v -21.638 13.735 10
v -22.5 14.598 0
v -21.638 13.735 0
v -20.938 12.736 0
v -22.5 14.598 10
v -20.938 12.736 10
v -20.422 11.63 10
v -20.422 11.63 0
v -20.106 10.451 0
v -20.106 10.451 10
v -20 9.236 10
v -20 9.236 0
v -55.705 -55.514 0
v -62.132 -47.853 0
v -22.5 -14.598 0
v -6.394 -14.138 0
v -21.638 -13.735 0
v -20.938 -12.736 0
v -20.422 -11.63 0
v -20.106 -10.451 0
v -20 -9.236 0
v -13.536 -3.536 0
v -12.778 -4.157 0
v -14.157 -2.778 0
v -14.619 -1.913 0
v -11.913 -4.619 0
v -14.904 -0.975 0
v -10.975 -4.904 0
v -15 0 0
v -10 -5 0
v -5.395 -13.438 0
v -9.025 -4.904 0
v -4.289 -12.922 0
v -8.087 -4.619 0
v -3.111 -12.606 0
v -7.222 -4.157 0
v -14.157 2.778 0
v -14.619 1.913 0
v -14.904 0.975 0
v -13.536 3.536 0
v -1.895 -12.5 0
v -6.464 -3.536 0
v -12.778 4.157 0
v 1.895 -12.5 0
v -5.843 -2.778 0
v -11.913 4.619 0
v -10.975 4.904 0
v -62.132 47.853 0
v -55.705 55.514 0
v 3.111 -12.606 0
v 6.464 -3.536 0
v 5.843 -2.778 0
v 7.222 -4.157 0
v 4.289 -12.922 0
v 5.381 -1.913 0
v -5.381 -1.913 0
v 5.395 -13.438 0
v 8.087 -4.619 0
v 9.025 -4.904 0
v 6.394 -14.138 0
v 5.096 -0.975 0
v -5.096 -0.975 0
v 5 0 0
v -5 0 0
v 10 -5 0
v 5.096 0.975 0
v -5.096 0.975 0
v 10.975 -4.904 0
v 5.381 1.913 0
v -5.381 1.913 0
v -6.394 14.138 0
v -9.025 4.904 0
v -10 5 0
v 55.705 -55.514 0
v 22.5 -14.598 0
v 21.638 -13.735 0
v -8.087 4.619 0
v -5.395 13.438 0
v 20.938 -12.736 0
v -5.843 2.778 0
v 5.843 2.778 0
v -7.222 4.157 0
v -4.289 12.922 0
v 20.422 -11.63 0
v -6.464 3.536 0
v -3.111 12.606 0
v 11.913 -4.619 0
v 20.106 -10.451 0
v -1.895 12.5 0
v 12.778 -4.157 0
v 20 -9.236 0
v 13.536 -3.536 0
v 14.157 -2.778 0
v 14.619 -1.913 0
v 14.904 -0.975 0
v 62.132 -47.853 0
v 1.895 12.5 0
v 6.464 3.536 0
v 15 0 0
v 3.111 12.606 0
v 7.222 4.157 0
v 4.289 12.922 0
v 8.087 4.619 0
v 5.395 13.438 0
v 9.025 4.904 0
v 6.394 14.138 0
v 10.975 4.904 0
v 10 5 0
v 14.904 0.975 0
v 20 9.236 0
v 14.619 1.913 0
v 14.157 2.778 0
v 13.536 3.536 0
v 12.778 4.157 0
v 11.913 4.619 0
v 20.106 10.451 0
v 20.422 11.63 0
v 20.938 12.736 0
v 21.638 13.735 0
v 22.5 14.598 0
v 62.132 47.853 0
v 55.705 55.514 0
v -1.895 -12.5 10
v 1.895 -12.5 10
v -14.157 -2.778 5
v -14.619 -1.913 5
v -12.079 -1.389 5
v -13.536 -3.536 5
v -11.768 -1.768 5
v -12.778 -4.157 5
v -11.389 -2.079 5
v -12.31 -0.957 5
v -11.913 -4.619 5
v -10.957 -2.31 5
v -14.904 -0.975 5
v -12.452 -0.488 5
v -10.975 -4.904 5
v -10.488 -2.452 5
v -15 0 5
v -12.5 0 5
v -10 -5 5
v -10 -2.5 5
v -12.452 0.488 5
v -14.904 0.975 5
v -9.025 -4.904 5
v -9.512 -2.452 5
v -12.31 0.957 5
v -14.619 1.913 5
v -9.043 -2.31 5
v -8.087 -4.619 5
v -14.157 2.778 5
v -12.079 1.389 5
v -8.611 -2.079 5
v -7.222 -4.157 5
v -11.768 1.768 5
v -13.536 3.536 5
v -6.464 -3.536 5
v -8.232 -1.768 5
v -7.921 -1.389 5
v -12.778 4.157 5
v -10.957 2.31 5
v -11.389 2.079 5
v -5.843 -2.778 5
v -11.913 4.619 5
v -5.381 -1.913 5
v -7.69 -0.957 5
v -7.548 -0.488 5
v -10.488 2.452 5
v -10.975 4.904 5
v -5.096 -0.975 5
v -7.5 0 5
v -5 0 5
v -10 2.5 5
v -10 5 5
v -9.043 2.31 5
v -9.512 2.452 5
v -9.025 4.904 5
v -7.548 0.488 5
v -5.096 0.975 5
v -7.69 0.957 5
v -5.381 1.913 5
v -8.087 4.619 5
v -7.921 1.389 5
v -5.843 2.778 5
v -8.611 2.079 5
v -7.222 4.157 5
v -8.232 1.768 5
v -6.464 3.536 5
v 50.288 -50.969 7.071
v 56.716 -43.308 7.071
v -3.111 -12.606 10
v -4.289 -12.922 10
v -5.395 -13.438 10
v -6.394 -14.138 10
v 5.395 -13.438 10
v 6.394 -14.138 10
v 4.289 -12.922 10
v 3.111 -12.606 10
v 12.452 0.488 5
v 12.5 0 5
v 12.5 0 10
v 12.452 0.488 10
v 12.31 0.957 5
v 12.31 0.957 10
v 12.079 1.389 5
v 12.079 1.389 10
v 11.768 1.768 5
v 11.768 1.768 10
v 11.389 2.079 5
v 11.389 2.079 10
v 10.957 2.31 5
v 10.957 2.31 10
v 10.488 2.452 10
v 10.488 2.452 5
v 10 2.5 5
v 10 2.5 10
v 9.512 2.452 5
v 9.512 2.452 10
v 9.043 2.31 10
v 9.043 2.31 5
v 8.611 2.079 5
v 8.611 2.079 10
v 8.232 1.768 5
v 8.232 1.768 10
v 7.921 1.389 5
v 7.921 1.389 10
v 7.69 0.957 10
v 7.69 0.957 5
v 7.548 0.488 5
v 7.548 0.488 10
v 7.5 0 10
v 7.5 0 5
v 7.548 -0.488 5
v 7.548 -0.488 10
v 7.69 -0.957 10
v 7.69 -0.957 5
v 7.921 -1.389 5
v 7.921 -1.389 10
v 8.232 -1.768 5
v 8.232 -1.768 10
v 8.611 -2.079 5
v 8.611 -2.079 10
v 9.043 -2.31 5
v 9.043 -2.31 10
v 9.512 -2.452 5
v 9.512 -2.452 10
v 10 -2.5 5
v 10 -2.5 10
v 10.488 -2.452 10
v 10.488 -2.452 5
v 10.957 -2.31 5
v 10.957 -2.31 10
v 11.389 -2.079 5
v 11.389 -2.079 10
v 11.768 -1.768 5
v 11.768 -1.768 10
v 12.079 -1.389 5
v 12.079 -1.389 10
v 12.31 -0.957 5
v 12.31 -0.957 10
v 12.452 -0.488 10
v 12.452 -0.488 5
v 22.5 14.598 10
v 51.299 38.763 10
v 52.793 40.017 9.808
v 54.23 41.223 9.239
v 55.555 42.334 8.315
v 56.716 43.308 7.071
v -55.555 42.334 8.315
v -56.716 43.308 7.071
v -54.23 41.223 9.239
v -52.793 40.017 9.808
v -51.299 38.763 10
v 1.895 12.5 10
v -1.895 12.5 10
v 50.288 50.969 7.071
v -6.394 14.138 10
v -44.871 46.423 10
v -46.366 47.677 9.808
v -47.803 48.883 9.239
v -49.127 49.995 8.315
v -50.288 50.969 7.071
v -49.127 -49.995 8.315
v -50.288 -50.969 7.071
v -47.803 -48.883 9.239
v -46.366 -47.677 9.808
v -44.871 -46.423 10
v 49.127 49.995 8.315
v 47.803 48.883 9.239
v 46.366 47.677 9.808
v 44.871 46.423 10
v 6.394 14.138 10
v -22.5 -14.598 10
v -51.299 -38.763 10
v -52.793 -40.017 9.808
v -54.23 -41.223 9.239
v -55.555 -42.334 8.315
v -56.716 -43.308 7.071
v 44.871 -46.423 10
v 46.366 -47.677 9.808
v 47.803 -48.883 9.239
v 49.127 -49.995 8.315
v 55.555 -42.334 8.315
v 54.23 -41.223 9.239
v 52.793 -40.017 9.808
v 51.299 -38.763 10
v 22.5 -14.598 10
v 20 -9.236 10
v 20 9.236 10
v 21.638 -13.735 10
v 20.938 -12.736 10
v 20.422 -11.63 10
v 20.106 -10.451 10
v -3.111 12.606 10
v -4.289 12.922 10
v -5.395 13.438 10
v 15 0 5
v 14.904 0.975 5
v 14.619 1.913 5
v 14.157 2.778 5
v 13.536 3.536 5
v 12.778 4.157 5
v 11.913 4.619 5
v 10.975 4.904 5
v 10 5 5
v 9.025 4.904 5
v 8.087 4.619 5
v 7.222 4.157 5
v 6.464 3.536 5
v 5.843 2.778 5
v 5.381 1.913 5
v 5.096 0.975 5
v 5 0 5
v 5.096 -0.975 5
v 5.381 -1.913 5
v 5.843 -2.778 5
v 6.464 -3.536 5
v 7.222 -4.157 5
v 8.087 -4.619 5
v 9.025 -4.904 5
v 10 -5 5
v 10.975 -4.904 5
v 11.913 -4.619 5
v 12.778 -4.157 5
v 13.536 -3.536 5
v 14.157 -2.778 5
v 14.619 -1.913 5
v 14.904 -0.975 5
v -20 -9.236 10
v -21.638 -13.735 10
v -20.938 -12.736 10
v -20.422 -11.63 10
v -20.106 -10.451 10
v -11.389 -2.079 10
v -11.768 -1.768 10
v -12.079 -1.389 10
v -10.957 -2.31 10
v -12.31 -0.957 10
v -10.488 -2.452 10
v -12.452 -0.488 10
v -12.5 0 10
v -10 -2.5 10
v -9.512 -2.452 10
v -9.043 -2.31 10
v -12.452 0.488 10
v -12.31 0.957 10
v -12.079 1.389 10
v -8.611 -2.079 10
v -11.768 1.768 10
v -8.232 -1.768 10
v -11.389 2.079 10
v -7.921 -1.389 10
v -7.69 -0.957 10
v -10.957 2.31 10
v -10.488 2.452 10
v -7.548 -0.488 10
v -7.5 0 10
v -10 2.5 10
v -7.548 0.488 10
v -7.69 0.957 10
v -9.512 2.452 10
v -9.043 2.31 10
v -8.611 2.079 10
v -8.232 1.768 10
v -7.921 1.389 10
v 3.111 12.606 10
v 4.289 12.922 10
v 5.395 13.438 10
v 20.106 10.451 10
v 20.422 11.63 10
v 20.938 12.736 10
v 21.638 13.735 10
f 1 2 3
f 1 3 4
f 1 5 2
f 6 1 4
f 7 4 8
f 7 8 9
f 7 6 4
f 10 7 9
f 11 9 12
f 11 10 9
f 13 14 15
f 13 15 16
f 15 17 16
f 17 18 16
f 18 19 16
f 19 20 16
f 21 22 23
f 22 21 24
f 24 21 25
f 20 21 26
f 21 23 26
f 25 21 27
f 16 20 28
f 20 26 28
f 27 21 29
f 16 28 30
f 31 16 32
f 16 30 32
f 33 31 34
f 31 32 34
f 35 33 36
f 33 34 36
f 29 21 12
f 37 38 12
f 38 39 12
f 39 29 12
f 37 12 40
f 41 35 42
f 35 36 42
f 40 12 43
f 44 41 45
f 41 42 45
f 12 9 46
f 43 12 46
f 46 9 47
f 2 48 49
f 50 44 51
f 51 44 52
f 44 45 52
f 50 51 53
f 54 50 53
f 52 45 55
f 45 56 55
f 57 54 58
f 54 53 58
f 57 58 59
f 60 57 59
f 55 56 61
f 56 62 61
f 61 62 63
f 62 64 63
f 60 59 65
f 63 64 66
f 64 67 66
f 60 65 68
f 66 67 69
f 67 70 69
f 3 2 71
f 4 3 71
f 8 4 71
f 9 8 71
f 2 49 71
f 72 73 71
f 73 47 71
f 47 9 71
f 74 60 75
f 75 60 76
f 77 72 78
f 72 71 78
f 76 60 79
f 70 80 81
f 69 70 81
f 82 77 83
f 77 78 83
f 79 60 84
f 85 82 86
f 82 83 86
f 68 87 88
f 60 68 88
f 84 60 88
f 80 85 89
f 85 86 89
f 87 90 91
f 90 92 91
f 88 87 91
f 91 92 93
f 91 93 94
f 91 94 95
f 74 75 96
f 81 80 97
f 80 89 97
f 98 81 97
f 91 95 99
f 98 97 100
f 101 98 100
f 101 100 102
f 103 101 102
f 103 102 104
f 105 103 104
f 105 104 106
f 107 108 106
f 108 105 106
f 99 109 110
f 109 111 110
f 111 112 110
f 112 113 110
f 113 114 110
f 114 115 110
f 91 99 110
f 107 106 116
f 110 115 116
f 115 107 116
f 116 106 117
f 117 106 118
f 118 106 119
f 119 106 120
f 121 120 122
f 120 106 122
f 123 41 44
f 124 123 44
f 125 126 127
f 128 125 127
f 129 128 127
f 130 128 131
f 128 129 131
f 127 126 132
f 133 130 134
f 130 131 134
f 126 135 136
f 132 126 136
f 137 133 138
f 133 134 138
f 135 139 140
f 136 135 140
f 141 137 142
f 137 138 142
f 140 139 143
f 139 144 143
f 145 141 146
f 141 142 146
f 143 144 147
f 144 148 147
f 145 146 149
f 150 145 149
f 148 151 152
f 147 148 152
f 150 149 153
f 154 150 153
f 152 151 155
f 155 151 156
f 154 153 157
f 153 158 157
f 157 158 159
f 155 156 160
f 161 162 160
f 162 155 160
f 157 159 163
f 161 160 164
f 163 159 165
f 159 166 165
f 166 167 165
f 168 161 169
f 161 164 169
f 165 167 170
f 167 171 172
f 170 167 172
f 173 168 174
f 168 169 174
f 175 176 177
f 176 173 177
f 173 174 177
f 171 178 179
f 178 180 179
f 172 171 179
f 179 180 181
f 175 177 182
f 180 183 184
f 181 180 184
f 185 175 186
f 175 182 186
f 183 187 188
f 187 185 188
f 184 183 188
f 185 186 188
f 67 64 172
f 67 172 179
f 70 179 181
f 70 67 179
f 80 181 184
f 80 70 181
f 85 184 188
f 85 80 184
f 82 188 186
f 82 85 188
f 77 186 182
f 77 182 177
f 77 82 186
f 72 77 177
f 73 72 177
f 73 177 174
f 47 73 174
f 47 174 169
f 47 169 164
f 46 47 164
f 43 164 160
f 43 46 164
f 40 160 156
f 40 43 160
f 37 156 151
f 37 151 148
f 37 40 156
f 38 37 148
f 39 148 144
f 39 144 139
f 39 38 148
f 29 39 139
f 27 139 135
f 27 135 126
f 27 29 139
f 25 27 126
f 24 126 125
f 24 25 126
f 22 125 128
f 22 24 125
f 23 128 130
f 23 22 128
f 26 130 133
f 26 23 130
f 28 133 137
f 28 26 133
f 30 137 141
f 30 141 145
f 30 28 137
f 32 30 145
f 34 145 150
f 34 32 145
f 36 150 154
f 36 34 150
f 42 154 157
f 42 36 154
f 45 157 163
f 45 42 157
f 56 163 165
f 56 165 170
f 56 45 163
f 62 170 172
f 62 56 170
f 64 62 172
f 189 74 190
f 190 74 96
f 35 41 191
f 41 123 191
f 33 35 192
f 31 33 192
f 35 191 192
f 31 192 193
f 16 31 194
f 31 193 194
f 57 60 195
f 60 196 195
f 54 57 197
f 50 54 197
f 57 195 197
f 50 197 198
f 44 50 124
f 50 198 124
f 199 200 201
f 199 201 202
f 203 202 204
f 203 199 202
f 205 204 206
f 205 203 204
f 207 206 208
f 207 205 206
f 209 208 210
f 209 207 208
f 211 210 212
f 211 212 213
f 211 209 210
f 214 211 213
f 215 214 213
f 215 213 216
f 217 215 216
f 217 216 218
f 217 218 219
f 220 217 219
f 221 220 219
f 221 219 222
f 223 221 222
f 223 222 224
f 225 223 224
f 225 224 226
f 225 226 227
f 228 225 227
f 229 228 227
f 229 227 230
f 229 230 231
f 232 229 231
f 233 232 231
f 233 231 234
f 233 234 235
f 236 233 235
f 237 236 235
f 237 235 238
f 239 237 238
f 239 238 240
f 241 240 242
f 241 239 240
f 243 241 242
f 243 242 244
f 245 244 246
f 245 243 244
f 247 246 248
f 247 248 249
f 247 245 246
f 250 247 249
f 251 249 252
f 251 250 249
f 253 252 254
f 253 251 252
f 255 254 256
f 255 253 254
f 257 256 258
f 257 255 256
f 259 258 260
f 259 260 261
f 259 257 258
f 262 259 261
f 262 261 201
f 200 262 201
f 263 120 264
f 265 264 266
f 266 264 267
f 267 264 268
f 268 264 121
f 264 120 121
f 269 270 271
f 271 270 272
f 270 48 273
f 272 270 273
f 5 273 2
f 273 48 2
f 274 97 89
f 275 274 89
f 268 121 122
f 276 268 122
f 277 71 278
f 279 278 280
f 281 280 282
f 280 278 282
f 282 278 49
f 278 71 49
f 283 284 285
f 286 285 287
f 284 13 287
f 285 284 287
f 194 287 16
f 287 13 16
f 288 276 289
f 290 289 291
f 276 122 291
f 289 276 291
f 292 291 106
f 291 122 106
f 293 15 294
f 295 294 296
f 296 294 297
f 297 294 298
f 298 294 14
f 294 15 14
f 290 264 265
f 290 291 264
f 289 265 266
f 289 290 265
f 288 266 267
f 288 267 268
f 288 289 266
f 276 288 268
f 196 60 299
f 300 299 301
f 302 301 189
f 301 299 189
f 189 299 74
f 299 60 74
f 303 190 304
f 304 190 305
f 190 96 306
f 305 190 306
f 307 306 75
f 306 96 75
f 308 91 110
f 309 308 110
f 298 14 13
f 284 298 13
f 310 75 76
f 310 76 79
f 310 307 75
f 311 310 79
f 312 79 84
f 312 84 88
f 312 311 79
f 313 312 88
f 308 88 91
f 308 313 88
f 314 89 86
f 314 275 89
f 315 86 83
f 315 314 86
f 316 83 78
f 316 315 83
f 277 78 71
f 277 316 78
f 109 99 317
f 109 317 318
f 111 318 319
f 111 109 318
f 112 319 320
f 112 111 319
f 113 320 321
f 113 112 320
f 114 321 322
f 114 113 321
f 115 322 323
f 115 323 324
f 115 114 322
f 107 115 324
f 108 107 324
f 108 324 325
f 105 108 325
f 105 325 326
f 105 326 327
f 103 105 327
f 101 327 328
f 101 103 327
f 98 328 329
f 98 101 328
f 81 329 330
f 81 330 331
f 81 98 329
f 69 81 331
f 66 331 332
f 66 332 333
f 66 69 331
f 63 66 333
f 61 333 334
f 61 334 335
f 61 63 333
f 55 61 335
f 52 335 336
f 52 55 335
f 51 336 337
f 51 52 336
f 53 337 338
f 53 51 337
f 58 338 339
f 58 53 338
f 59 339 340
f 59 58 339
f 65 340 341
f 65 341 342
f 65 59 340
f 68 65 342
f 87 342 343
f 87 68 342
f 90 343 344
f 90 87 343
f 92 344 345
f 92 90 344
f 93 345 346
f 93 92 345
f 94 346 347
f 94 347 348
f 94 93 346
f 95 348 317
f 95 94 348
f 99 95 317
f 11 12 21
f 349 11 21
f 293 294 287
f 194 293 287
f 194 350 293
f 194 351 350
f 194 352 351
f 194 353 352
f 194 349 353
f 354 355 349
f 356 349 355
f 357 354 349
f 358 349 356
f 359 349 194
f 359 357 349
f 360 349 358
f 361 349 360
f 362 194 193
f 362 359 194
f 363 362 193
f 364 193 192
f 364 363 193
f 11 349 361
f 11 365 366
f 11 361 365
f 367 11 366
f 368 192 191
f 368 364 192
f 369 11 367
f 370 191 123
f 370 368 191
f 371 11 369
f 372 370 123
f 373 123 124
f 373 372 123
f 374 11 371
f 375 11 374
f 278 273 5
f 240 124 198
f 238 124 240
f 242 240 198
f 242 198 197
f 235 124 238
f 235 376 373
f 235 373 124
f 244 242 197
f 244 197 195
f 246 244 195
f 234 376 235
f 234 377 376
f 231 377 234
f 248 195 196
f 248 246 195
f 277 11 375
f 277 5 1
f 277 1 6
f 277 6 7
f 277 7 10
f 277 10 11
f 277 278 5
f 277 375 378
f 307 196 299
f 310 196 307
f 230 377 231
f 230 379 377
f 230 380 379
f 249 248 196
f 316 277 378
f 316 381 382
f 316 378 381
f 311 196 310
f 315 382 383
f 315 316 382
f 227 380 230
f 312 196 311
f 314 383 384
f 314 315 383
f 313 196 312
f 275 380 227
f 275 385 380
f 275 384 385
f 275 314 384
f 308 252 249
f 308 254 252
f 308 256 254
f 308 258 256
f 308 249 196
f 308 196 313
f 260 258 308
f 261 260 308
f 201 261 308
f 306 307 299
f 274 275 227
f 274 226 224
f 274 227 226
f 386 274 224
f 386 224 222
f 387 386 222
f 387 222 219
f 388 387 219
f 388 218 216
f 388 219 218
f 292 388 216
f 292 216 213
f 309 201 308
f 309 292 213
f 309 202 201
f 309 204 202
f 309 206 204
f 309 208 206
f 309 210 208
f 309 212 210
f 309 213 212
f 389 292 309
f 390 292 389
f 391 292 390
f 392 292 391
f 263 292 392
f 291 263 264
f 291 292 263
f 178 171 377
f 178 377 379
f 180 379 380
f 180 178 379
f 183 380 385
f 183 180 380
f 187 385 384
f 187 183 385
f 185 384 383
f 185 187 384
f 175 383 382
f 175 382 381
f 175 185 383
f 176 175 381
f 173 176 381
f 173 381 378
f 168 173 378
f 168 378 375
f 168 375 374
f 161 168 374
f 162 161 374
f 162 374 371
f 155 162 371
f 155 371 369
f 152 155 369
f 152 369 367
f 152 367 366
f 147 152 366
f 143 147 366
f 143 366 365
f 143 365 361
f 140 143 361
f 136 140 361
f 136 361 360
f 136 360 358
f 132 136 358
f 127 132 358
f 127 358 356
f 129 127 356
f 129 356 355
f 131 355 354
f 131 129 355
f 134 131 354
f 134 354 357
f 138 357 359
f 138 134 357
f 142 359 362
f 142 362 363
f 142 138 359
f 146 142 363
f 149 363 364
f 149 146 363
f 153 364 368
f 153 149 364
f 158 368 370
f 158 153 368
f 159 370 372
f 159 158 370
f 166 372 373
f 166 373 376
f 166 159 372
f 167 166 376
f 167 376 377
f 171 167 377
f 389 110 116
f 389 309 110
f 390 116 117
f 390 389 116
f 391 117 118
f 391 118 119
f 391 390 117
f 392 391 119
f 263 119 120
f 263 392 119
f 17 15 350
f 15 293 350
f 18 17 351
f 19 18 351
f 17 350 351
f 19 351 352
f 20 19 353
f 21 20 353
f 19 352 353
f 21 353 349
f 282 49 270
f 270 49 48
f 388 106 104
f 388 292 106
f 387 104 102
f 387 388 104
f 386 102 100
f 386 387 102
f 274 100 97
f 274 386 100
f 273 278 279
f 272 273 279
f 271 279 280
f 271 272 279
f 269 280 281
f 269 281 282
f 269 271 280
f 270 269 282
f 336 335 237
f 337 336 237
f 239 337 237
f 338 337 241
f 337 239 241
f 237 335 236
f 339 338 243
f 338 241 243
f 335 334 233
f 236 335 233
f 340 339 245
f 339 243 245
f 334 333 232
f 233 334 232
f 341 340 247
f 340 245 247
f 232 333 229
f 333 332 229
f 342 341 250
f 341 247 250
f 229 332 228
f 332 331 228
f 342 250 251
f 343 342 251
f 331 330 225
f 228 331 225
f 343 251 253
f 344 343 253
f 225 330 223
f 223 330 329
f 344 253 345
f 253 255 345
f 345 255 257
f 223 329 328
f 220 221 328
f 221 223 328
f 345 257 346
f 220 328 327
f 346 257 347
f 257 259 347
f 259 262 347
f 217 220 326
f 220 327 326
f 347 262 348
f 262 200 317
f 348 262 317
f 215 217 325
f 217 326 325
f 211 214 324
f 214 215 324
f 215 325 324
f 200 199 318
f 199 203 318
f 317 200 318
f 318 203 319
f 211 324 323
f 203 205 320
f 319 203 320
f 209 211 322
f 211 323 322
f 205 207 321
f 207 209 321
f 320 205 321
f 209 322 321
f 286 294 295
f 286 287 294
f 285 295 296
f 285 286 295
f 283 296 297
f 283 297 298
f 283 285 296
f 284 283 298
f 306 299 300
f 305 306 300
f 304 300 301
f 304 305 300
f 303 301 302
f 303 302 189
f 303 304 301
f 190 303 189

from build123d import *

# Parameters (mm, degrees)
F0_R     = 5
F0_R_2   = 2.5
F1_DEPTH = 10
F2_DEPTH = 5
F3_SIZE  = 9.99999
F4_R     = 7
F5_R     = 10


# Not quite as in the source:
# - a fillet or chamfer is up to 0.001 mm smaller than in the source, because OpenCascade refuses the exact size


with BuildPart() as f1:
    # F0 (on Top) → F1 (new body)
    with BuildSketch(Plane.XY):
        Polygon((4.4427617314, -12.5), (20, -12.5), (20, 12.5), (4.4427617314, 12.5), (-4.4427617314, 12.5), (-20, 12.5), (-20, -12.5), (-4.4427617314, -12.5), align=None)
        with Locations((-10, 0)):
            Circle(F0_R, mode=Mode.SUBTRACT)
        with Locations((10, 0)):
            Circle(F0_R, mode=Mode.SUBTRACT)
        Polygon((-55.7045682747, -55.5137629639), (-4.4427617314, -12.5), (-20, -12.5), (-62.1324443715, -47.8533185328), align=None)
        Polygon((62.1324443715, -47.8533185328), (20, -12.5), (4.4427617314, -12.5), (55.7045682747, -55.5137629639), align=None)
        Polygon((4.4427617314, 12.5), (20, 12.5), (62.1324443715, 47.8533185328), (55.7045682747, 55.5137629639), align=None)
        Polygon((-20, 12.5), (-4.4427617314, 12.5), (-55.7045682747, 55.5137629639), (-62.1324443715, 47.8533185328), align=None)
        with Locations((10, 0)):
            Circle(F0_R)
        with Locations((10, 0)):
            Circle(F0_R_2, mode=Mode.SUBTRACT)
        with Locations((-10, 0)):
            Circle(F0_R)
        with Locations((-10, 0)):
            Circle(F0_R_2, mode=Mode.SUBTRACT)
    extrude(amount=F1_DEPTH)

    # F0 (on Top) → F2 (cut)
    with BuildSketch(Plane.XY):
        with Locations((-10, 0)):
            Circle(F0_R)
        with Locations((-10, 0)):
            Circle(F0_R_2, mode=Mode.SUBTRACT)
        with Locations((10, 0)):
            Circle(F0_R)
        with Locations((10, 0)):
            Circle(F0_R_2, mode=Mode.SUBTRACT)
    extrude(amount=F2_DEPTH, mode=Mode.SUBTRACT)

    # F3 (size 10 in the source; OpenCascade refuses exactly that, so slightly less here)
    f3_edges = [f1.edges().sort_by_distance(p)[0] for p in [
        (58.918506, -51.683541, 10),
        (58.918506, 51.683541, 10),
        (-58.918506, 51.683541, 10),
        (-58.918506, -51.683541, 10),
    ]]
    chamfer(f3_edges, length=F3_SIZE)

    # F4
    f4_edges = [f1.edges().sort_by_distance(p)[0] for p in [
        (4.442762, 12.5, 5),
        (-4.442762, 12.5, 5),
        (4.442762, -12.5, 5),
        (-4.442762, -12.5, 5),
        (-20, -12.5, 5),
        (-20, 12.5, 5),
        (20, -12.5, 5),
        (20, 12.5, 5),
    ]]
    fillet(f4_edges, radius=F4_R)

    # F5
    f5_edges = [f1.edges().sort_by_distance(p)[0] for p in [
        (-51.25807, 45.255671, 10),
        (-51.25807, -45.255671, 10),
        (51.25807, 45.255671, 10),
        (51.25807, -45.255671, 10),
    ]]
    fillet(f5_edges, radius=F5_R)


solid = f1.part
